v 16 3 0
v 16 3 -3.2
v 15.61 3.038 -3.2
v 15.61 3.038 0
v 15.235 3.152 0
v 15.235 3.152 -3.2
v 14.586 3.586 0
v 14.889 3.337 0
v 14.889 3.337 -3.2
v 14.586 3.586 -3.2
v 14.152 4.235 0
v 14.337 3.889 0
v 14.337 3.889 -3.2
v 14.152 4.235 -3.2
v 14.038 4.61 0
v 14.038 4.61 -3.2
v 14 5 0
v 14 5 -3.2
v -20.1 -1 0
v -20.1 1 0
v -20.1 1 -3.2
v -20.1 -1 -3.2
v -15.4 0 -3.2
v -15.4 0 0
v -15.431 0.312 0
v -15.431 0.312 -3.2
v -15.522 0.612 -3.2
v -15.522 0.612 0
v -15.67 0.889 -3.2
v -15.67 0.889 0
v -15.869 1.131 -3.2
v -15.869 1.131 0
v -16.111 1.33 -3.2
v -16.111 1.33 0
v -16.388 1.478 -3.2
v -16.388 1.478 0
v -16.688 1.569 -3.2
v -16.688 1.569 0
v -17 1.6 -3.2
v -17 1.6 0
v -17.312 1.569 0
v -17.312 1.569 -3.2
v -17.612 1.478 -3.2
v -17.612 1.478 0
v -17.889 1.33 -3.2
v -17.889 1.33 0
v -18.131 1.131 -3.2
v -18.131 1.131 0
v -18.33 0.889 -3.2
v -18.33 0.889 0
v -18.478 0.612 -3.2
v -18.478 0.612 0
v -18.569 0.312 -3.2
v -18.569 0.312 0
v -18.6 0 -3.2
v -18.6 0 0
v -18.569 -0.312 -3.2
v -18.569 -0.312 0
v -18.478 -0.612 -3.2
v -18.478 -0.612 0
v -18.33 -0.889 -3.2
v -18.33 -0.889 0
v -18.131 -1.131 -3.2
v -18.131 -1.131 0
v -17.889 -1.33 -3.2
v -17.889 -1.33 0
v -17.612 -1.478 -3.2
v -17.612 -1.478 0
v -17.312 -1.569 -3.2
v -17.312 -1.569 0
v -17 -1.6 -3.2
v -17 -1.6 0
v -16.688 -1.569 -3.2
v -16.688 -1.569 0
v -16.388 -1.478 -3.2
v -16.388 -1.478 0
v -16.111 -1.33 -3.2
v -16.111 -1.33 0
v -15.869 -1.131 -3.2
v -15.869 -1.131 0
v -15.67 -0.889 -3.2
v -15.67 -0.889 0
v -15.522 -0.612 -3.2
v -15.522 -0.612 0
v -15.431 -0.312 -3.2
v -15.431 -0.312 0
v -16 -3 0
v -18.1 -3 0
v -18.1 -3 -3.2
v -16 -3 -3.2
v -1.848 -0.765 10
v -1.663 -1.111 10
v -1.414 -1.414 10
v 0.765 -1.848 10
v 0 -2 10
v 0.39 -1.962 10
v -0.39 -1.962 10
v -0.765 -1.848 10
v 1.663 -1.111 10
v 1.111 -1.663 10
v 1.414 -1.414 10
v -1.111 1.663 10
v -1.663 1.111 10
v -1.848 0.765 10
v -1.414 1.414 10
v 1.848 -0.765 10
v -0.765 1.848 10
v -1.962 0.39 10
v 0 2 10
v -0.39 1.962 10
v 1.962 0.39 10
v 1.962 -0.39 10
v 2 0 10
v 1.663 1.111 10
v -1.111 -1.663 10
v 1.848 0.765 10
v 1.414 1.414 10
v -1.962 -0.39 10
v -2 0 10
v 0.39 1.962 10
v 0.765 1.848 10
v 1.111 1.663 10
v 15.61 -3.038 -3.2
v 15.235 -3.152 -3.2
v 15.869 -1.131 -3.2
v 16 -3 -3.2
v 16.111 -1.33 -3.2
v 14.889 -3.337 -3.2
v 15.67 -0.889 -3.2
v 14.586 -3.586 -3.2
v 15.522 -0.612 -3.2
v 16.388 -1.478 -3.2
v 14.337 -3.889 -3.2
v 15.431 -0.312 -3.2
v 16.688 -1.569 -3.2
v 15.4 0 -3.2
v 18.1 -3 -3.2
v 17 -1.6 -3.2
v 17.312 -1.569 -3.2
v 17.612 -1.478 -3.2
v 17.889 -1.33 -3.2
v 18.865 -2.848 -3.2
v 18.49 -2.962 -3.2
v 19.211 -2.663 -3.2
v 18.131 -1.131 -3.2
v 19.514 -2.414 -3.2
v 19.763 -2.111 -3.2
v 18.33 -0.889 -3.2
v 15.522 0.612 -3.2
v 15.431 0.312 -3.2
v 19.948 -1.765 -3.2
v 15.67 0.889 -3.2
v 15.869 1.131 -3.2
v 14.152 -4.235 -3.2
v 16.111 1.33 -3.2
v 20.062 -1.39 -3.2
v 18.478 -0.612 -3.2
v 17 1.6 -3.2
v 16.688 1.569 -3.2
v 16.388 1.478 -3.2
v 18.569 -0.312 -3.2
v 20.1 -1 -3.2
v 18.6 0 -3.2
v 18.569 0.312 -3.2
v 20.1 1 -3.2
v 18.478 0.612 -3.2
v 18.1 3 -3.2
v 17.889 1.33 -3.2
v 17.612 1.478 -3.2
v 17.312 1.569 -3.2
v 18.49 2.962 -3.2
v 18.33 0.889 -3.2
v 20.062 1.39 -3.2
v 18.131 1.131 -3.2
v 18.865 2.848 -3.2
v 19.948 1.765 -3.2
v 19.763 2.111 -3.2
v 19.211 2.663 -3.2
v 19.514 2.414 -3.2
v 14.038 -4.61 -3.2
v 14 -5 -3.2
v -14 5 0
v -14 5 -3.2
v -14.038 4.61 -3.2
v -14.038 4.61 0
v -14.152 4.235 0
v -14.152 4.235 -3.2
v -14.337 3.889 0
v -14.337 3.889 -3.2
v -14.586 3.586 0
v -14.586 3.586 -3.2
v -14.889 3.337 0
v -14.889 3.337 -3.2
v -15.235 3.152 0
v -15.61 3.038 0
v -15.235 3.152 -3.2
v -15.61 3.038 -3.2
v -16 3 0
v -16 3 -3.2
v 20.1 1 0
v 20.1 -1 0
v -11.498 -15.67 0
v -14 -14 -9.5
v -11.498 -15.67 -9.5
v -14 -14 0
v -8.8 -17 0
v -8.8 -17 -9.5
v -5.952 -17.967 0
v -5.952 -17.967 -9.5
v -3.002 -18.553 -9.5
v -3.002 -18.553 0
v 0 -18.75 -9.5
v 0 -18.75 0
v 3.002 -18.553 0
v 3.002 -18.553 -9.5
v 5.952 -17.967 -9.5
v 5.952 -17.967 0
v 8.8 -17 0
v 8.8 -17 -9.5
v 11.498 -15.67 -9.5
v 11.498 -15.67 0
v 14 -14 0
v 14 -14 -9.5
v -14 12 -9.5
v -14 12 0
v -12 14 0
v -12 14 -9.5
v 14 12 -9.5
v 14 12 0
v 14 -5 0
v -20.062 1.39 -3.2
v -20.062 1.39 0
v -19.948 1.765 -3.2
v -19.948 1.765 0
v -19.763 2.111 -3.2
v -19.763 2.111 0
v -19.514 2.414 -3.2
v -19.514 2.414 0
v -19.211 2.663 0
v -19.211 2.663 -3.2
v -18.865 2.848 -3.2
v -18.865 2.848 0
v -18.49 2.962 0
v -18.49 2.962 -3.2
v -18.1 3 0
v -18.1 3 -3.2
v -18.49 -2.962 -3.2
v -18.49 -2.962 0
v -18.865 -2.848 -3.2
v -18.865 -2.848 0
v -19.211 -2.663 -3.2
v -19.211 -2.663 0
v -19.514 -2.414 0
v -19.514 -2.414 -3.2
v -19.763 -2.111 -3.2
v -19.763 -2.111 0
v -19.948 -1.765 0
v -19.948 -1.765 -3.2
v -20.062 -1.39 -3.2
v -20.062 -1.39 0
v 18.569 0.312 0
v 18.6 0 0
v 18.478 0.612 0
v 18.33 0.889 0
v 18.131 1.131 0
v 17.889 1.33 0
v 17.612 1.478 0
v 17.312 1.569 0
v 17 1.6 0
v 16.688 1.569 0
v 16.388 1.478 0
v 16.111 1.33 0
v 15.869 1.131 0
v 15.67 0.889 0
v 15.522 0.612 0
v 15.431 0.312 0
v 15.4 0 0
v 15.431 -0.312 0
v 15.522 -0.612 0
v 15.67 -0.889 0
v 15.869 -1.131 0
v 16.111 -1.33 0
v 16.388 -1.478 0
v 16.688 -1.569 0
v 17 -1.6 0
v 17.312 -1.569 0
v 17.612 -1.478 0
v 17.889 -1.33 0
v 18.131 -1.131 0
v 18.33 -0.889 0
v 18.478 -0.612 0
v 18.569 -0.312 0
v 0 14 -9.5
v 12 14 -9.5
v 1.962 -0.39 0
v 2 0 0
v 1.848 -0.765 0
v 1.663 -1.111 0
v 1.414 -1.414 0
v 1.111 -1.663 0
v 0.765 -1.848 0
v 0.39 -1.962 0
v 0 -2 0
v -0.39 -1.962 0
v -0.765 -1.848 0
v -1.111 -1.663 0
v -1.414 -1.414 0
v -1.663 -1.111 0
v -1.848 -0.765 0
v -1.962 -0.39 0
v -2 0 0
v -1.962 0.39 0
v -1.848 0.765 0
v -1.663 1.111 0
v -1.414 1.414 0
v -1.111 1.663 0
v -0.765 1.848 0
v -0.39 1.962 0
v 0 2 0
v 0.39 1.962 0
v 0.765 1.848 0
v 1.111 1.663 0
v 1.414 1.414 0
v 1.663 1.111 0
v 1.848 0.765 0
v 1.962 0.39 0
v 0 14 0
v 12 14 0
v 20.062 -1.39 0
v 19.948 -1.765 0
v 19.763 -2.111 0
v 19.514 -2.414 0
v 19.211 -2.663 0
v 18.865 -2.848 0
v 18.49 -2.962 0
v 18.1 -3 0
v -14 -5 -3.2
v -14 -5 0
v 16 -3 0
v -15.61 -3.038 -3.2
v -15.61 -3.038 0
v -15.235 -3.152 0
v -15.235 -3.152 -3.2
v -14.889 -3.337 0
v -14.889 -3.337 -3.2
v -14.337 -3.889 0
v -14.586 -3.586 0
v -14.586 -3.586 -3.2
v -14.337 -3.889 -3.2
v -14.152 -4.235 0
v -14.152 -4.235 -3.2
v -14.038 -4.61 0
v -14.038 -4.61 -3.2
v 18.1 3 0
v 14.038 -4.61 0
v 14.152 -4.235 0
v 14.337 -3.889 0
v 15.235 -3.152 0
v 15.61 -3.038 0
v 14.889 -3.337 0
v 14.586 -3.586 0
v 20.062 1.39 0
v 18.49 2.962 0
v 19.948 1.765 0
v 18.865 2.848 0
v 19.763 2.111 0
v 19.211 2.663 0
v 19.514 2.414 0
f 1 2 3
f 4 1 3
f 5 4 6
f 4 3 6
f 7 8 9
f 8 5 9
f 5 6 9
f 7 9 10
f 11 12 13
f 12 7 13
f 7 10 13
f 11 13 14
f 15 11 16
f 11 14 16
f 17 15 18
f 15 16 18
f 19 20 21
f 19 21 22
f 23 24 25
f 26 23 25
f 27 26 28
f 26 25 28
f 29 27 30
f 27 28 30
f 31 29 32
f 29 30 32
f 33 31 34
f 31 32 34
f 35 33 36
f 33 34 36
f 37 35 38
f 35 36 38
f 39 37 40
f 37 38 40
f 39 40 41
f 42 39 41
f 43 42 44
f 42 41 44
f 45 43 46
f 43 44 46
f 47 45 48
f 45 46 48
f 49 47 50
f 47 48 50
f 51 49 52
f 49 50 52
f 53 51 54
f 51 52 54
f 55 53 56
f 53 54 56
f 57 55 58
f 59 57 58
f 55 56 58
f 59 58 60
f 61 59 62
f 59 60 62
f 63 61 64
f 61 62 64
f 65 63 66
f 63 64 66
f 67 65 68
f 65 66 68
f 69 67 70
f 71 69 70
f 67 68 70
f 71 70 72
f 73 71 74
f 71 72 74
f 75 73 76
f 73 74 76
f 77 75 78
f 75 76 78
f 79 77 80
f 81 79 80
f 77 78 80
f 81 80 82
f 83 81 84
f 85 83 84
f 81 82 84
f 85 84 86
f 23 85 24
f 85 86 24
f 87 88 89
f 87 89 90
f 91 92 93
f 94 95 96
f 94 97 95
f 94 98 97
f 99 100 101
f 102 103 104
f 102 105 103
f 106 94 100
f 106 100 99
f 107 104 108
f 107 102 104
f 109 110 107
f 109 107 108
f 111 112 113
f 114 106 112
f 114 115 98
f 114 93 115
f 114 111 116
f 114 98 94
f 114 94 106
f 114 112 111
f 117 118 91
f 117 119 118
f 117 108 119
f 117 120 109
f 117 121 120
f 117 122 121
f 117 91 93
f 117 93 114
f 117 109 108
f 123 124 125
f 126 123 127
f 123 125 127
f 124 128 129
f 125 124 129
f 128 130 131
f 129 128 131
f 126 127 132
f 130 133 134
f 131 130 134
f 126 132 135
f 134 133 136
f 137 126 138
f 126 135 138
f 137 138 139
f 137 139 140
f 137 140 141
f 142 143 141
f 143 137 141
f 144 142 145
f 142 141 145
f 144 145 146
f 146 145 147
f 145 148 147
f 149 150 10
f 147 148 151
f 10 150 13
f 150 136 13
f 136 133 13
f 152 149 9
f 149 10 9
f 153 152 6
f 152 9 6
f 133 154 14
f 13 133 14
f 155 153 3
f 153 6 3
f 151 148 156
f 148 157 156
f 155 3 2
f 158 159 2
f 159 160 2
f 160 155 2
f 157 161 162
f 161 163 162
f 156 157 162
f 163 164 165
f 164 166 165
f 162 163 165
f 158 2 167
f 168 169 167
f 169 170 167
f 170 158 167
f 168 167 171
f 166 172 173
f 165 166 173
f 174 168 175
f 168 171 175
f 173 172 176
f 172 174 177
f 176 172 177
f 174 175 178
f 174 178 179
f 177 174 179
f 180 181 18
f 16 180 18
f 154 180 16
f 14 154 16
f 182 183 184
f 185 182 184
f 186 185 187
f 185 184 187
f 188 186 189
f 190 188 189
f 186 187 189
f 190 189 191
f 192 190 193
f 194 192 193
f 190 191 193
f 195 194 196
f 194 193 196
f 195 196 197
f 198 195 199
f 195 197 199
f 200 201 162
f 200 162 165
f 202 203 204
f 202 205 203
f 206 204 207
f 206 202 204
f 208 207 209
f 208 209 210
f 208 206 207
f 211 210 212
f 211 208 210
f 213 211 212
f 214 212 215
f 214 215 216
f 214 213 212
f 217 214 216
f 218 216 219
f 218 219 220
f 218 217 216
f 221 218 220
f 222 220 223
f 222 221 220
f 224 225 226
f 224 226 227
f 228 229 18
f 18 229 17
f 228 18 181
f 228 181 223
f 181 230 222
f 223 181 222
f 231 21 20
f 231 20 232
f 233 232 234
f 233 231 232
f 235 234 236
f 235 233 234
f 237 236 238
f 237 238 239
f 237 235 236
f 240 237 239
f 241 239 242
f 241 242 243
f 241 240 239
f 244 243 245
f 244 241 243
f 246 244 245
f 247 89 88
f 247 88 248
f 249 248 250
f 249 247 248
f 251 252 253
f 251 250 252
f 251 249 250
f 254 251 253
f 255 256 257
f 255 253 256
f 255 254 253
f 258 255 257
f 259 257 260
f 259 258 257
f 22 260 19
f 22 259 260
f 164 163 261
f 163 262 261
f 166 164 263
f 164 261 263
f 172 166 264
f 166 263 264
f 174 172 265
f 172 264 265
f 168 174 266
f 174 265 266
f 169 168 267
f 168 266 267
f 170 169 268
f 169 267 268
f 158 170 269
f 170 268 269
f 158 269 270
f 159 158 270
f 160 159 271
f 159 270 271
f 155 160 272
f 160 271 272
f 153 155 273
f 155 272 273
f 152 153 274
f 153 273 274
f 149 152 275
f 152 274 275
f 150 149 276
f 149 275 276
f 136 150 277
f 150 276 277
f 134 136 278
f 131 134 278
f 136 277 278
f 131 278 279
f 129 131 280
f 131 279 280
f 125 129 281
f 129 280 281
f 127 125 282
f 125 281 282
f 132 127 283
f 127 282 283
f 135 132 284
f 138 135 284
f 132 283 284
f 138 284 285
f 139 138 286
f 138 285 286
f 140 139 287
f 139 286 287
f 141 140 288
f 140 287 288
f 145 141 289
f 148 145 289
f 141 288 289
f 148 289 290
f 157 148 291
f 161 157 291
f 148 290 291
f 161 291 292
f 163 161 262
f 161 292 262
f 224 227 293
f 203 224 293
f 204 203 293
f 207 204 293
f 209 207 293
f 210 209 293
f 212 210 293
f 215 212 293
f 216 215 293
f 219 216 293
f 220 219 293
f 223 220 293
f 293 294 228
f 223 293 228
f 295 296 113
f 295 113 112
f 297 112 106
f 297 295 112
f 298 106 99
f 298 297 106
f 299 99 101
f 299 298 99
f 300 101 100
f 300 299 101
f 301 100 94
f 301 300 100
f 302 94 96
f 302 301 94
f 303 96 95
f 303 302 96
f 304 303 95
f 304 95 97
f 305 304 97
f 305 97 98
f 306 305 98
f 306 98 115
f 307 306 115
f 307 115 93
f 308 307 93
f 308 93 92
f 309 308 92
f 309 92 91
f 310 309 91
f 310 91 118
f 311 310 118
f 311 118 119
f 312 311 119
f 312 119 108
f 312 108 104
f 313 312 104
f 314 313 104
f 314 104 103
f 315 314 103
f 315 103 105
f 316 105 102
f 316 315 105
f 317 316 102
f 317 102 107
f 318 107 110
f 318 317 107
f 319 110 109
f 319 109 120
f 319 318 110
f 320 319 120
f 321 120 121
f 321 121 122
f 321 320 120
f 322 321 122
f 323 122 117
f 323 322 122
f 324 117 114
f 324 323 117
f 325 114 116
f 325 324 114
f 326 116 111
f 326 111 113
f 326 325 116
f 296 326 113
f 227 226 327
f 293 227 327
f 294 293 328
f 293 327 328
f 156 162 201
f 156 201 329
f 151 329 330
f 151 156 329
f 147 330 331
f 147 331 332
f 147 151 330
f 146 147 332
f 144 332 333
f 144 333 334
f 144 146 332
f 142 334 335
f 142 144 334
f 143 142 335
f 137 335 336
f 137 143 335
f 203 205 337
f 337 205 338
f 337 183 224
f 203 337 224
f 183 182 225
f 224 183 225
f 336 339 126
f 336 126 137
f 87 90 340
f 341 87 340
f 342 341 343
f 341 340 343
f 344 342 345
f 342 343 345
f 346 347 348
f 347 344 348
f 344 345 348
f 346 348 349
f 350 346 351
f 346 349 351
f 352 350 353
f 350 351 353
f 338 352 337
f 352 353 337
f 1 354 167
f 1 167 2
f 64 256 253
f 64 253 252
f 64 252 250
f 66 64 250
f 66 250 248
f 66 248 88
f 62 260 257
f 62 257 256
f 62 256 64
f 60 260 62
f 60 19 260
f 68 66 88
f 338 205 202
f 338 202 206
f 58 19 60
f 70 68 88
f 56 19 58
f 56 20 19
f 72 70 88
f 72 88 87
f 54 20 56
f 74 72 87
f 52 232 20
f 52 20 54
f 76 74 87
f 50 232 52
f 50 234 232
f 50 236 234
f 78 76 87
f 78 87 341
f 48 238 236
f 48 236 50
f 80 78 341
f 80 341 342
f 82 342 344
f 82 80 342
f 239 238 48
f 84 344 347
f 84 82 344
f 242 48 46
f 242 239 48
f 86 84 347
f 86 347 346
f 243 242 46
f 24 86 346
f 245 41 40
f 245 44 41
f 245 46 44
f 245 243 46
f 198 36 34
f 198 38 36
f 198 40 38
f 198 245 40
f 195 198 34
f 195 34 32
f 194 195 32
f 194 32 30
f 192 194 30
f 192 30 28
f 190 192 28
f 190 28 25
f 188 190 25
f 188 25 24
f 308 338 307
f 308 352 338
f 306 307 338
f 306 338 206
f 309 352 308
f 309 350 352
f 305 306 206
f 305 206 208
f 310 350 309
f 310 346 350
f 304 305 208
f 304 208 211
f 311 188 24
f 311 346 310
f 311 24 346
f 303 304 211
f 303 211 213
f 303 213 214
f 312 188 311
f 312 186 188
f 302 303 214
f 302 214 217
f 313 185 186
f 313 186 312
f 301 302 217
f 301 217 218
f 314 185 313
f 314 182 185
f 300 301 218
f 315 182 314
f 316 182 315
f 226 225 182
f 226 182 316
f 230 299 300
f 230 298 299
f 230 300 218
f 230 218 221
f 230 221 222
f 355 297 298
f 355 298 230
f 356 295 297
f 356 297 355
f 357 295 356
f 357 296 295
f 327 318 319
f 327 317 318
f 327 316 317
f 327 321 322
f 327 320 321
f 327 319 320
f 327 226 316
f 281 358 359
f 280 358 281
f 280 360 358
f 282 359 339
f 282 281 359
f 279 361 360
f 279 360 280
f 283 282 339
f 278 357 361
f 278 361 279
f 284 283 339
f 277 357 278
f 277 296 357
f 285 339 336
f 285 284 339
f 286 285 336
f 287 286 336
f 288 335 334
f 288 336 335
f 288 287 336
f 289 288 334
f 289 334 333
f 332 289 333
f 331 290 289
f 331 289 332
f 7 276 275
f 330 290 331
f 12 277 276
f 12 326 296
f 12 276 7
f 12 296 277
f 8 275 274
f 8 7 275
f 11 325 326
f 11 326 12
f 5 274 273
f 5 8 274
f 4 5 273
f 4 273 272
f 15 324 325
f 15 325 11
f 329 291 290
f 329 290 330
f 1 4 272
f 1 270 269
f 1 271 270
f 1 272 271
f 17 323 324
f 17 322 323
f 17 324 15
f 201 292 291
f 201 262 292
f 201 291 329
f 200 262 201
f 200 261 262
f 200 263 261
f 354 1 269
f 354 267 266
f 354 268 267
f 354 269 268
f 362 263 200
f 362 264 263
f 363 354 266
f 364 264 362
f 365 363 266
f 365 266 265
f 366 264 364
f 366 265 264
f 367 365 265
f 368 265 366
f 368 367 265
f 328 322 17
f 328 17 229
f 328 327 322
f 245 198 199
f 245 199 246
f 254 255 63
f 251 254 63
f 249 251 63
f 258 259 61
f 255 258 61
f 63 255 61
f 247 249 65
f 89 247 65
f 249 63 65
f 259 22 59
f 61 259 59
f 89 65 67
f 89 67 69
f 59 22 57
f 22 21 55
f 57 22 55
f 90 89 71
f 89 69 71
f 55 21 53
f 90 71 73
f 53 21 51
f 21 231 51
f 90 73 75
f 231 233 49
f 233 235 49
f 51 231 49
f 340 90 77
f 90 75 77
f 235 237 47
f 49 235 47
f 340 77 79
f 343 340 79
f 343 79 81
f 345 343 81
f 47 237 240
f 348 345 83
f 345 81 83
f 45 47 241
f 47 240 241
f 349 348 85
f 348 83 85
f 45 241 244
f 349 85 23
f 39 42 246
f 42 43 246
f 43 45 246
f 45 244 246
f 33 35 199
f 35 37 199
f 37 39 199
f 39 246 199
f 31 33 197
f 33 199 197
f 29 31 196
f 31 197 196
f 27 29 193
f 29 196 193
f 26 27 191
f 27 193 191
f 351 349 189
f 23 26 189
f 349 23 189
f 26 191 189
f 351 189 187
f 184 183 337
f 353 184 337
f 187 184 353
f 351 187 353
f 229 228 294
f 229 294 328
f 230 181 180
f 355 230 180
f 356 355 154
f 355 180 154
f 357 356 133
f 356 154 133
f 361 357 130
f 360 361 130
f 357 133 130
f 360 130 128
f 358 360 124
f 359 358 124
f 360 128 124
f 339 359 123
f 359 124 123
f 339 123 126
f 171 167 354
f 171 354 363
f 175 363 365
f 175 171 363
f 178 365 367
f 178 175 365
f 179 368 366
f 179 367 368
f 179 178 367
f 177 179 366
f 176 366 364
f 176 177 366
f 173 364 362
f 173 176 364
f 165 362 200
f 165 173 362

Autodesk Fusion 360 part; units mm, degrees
sketch "Skizze1" plane through (0, 0, 0) normal (0, 0, 1) x (1, 0, 0)
  line L0 (-14, 14) -> (14, 14)
  line L1 (14, 14) -> (14, -14)
  line L2 (14, -14) -> (-14, -14)
  line L3 (-14, -14) -> (-14, 14)
  arc A0 (-14, -14) -> (14, -14) centre (0, 4.2566) ccw
  line L4 (-14, 3) -> (-20.1, 3)
  line L5 (-20.1, 3) -> (-20.1, -3)
  line L6 (-20.1, -3) -> (-14, -3)
  line L7 (-14, -3) -> (-14, 3)
  circle A1 centre (-17, 0) radius 1.6
  circle A2 centre (17, 0) radius 1.6
  line L8 (14, -3) -> (20.1, -3)
  line L9 (20.1, 3) -> (14, 3)
  line L10 (14, 3) -> (14, -3)
  line L11 (20.1, -3) -> (20.1, 3)
  line L12 (0, 1.75) -> (0, 22.5)
  circle A3 centre (0, 0) radius 2
  point P0 (0, -18.75)
  dimension "d16" = 40.2
  dimension "d17" = 28
  dimension "d18" = 6.1
  dimension "d21" = 4
extrude "Extrusion1" add sketch "Skizze1" along normal blind 10 contours A3 makes body 1
extrude "Extrusion2" add sketch "Skizze1" against normal blind 9.5 separate body contours L0 L1 L2 L3 L7 L10 makes body 2
extrude "Extrusion3" add sketch "Skizze1" against normal blind 9.5 contours L2 A0 bodies 2
extrude "Extrusion4" add sketch "Skizze1" against normal blind 9.5 contours A3 bodies 1 2
extrude "Extrusion5" add sketch "Skizze1" against normal blind 3.2 contours L1 L8 L9 L10 L11 bodies 1
extrude "Extrusion6" add sketch "Skizze1" against normal blind 3.2 contours L3 L4 L5 L6 L7 bodies 1
chamfer "Fase1" distance 2 angle 45 1 edges at (14, 14, -4.75) on bodies 1
chamfer "Fase2" distance 2 angle 45 1 edges at (-14, 14, -4.75) on bodies 1
fillet "Abrundung1" radius 2 1 edges at (-14, 3, -1.6) on bodies 1
fillet "Abrundung2" radius 2 1 edges at (14, 3, -1.6) on bodies 1
fillet "Abrundung3" radius 2 1 edges at (14, -3, -1.6) on bodies 1
fillet "Abrundung4" radius 2 1 edges at (-14, -3, -1.6) on bodies 1
fillet "Abrundung5" radius 2 1 edges at (20.1, 3, -1.6) on bodies 1
fillet "Abrundung6" radius 2 1 edges at (20.1, -3, -1.6) on bodies 1
fillet "Abrundung7" radius 2 1 edges at (-20.1, 3, -1.6) on bodies 1
fillet "Abrundung8" radius 2 1 edges at (-20.1, -3, -1.6) on bodies 1
